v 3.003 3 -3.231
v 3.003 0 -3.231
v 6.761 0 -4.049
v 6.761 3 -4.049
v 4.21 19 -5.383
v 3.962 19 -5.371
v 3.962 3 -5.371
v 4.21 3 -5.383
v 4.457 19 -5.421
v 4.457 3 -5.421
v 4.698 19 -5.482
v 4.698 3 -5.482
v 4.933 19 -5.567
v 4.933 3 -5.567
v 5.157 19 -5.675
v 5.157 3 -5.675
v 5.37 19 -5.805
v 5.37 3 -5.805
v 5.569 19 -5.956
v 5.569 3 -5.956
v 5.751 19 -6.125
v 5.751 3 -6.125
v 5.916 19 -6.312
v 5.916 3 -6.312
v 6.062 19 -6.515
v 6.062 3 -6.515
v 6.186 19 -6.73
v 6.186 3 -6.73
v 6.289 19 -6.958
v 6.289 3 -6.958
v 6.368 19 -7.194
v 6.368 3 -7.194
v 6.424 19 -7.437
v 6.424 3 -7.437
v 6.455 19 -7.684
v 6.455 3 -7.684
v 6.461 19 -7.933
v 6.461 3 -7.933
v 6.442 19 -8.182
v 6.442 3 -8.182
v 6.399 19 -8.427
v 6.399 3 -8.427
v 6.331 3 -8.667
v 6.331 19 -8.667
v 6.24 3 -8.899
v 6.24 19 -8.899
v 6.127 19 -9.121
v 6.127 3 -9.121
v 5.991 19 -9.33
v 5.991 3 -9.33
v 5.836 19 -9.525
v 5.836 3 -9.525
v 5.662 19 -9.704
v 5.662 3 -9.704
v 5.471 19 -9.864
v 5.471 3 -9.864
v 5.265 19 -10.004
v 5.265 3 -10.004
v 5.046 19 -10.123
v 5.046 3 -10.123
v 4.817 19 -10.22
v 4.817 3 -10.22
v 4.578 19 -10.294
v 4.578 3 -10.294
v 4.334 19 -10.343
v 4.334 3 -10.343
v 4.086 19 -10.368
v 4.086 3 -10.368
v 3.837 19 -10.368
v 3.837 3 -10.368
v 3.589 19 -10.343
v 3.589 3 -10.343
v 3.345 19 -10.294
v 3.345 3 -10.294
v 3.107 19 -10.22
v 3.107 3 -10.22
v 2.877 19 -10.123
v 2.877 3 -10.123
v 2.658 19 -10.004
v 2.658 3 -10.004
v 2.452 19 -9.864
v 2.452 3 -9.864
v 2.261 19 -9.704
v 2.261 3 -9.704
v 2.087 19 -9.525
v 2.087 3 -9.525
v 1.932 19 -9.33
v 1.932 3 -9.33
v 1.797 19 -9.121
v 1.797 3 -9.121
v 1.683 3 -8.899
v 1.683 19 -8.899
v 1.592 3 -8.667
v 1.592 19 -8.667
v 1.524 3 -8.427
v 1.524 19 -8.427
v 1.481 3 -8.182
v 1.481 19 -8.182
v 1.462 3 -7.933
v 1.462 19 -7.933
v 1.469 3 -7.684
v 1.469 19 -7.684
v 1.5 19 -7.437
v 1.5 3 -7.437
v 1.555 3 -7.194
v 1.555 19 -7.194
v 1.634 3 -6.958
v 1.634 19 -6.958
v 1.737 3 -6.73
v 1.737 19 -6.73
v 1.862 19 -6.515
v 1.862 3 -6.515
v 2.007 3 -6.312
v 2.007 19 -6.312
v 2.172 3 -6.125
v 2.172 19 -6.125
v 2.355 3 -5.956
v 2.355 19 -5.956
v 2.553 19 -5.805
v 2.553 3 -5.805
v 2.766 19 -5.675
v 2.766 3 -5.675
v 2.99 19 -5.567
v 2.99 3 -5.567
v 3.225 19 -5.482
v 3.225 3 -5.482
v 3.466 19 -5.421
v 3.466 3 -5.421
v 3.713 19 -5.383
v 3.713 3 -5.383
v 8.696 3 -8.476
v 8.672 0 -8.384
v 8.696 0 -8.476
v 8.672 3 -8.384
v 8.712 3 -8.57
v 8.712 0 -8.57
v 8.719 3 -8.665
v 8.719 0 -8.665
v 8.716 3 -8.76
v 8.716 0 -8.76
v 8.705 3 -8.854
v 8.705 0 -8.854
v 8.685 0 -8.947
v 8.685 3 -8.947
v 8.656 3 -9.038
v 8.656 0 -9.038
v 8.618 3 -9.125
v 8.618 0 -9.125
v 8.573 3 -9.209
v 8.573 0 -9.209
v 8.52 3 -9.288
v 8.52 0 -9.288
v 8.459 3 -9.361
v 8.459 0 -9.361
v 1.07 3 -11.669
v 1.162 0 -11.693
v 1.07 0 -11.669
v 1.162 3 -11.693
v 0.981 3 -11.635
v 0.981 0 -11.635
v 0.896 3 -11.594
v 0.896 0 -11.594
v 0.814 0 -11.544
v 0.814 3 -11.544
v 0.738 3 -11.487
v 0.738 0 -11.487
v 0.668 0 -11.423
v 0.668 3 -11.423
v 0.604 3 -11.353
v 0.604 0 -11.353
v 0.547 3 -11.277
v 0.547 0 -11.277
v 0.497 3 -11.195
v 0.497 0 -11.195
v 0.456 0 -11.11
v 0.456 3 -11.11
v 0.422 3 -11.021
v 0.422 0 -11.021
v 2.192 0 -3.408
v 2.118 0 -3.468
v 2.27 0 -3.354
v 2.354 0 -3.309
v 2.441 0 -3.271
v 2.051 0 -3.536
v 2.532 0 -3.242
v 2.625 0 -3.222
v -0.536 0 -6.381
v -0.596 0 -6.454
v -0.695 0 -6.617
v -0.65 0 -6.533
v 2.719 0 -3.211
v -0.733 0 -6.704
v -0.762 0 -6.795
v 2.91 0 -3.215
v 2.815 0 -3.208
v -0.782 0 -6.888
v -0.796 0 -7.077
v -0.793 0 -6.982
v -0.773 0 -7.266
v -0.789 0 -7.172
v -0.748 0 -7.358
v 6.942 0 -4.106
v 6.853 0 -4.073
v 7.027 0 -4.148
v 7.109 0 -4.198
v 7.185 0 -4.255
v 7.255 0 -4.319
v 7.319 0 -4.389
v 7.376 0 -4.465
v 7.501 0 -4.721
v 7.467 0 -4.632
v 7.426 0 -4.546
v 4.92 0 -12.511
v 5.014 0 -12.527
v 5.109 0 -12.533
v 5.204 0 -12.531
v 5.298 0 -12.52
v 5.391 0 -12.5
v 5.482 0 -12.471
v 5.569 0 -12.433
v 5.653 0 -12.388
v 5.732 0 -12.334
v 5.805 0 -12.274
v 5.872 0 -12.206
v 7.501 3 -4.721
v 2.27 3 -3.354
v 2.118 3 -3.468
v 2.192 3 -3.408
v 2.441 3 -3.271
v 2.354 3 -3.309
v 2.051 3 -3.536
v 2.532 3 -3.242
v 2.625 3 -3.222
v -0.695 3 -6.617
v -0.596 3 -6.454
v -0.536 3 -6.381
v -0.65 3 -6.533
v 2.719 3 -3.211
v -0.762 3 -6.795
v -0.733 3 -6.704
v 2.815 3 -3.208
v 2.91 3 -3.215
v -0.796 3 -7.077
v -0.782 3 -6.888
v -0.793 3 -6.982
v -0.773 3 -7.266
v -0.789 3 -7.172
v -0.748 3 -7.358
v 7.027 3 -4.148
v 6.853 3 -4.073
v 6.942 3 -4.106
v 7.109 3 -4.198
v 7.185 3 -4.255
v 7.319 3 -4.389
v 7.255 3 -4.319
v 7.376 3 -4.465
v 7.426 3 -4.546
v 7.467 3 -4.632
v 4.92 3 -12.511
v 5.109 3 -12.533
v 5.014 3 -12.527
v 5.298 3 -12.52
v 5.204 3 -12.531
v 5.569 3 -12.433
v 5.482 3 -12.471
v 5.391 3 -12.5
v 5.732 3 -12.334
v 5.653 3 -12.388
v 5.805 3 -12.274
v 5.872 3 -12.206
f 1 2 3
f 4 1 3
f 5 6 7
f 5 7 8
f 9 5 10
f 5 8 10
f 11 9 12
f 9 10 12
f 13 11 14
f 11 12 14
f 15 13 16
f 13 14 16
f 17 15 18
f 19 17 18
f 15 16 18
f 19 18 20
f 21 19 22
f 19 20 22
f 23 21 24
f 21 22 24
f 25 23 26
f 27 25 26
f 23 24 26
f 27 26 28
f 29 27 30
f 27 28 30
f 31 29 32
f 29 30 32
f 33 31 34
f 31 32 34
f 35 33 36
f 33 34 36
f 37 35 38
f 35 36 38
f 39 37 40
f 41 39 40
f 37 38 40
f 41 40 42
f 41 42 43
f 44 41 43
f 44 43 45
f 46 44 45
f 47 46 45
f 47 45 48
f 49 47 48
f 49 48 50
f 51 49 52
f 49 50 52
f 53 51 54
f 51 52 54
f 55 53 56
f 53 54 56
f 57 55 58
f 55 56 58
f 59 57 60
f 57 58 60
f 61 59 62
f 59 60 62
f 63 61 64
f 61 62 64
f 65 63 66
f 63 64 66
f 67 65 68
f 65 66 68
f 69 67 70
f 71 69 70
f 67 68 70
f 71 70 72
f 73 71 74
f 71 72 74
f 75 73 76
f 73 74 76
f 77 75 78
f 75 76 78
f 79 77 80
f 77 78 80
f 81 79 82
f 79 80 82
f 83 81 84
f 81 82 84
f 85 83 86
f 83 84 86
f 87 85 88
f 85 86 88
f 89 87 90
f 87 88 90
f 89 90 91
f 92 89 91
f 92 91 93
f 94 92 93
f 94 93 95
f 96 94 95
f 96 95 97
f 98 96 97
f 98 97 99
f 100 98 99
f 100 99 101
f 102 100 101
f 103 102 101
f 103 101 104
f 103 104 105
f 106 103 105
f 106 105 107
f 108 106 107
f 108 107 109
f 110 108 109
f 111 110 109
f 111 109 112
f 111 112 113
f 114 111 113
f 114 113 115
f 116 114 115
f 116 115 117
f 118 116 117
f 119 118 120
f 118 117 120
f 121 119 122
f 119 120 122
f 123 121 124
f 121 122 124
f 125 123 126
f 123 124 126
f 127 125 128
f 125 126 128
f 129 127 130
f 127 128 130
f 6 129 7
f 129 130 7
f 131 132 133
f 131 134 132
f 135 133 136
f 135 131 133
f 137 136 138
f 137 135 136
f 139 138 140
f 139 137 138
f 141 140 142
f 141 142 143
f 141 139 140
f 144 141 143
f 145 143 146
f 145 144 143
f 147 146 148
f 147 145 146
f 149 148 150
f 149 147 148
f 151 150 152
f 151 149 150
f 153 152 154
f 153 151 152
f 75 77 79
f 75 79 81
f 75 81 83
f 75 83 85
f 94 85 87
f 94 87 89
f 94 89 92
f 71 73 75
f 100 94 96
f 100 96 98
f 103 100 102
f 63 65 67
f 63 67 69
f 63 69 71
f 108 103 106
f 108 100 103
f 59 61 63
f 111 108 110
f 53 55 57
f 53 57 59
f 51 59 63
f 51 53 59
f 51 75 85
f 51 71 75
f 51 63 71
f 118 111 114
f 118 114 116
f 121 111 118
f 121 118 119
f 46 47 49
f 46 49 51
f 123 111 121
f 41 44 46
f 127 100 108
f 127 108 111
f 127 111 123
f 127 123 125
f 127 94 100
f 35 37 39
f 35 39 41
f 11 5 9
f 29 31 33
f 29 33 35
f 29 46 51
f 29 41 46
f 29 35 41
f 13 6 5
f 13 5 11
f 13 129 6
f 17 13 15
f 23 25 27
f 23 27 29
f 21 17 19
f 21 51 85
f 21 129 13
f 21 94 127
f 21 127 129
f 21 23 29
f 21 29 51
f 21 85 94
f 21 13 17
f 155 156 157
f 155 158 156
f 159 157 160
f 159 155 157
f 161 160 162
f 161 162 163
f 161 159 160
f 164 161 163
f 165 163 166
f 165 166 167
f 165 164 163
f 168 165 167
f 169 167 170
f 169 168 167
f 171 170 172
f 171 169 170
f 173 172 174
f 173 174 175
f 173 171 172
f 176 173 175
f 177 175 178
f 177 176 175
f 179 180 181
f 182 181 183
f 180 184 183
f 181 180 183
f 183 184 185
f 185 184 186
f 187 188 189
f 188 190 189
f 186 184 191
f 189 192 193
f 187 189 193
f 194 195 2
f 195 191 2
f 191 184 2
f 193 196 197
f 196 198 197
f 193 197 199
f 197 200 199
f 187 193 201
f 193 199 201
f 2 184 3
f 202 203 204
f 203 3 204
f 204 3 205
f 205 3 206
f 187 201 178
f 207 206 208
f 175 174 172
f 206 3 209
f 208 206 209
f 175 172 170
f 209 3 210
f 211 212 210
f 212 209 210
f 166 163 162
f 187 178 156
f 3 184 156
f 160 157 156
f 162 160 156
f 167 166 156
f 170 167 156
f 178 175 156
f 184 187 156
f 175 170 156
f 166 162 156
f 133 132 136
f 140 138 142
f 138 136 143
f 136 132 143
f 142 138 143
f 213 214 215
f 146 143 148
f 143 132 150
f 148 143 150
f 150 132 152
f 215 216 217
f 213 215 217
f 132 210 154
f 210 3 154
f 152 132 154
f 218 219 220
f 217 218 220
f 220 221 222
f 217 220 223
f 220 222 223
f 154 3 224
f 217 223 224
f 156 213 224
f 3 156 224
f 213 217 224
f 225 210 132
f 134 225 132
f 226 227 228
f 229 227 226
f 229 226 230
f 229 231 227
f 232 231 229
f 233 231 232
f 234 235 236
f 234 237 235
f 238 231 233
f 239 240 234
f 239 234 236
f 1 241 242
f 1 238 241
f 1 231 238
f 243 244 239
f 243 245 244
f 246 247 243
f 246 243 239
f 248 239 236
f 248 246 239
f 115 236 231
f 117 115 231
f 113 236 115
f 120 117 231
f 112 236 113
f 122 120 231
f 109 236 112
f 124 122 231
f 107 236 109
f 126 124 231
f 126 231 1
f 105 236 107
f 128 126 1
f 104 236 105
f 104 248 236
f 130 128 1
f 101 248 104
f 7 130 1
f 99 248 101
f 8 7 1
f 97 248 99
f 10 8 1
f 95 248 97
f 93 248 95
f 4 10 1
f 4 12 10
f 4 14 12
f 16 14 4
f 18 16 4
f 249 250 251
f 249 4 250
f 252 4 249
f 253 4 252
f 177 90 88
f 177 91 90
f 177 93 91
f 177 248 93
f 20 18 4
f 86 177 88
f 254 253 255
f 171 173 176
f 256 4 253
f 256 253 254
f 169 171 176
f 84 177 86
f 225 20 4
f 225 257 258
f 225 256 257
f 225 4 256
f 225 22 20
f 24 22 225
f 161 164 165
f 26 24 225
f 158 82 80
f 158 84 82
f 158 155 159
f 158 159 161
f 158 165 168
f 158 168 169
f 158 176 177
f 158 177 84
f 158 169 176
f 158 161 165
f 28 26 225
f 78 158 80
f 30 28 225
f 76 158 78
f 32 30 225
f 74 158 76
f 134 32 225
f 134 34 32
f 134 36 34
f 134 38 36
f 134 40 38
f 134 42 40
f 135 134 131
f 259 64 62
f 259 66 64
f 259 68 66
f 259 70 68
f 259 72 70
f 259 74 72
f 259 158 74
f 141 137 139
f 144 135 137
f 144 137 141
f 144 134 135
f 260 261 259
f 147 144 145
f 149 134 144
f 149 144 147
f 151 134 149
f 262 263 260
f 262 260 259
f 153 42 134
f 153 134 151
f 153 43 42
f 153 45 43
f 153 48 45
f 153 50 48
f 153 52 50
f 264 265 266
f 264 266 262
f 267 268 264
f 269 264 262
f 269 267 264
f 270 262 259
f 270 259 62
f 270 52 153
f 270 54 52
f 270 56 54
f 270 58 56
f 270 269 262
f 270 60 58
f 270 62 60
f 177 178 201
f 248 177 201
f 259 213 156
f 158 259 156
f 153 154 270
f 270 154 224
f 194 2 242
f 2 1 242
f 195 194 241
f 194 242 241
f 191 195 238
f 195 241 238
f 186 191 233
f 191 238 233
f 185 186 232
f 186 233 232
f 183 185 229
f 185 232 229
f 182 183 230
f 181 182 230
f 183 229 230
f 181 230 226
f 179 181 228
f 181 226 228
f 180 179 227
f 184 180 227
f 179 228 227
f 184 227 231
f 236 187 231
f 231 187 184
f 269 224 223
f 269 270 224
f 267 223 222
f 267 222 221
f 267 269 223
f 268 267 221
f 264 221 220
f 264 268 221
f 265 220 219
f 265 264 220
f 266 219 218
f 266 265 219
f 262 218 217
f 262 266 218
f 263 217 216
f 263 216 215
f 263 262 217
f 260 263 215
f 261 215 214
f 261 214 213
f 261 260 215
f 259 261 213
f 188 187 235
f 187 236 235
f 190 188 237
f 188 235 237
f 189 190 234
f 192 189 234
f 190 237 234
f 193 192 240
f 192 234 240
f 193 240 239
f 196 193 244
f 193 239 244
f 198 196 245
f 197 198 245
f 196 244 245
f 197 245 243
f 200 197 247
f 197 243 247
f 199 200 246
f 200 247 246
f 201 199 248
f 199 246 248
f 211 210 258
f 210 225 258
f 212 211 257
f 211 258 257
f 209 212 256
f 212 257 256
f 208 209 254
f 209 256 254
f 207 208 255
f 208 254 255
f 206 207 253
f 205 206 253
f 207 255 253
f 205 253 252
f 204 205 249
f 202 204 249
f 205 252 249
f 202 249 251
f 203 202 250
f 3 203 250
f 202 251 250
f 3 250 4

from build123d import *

# Parameters (mm, degrees)
EXTRUDE_1_DEPTH = 3
SKETCH_4_R      = 2.5
EXTRUDE_2_DEPTH = 16
FILLET_1_R      = 1


with BuildPart() as part:
    # 草图2 → 凸台-拉伸1 (new body)
    with BuildSketch(Plane(origin=(0, 0, 0), x_dir=(1, 0, 0), z_dir=(0, 1, 0))):
        Polygon((7.324934491, 4.171243509), (8.84728701, 8.933852332), (5.48392304, 12.633552699), (0.598206551, 11.570644242), (-0.924145968, 6.808035419), (2.439218002, 3.108335052), align=None)
    extrude(amount=EXTRUDE_1_DEPTH)

    # 草图4 → 凸台-拉伸2 (add)
    with BuildSketch(Plane(origin=(0, 3, 0), x_dir=(1, 0, 0), z_dir=(0, 1, 0))):
        with Locations(Location((3.961570521, 7.870943875, 0), (0, 0, 270))):
            Circle(SKETCH_4_R)
    extrude(amount=EXTRUDE_2_DEPTH)

    # 圆角1
    fillet_1_edges = [part.edges().sort_by_distance(p)[0] for p in [
        (8.84728701, 1.5, -8.933852332),
        (7.324934491, 1.5, -4.171243509),
        (2.439218002, 1.5, -3.108335052),
        (-0.924145968, 1.5, -6.808035419),
        (0.598206551, 1.5, -11.570644242),
        (5.48392304, 1.5, -12.633552699),
    ]]
    fillet(fillet_1_edges, radius=FILLET_1_R)


solid = part.part
